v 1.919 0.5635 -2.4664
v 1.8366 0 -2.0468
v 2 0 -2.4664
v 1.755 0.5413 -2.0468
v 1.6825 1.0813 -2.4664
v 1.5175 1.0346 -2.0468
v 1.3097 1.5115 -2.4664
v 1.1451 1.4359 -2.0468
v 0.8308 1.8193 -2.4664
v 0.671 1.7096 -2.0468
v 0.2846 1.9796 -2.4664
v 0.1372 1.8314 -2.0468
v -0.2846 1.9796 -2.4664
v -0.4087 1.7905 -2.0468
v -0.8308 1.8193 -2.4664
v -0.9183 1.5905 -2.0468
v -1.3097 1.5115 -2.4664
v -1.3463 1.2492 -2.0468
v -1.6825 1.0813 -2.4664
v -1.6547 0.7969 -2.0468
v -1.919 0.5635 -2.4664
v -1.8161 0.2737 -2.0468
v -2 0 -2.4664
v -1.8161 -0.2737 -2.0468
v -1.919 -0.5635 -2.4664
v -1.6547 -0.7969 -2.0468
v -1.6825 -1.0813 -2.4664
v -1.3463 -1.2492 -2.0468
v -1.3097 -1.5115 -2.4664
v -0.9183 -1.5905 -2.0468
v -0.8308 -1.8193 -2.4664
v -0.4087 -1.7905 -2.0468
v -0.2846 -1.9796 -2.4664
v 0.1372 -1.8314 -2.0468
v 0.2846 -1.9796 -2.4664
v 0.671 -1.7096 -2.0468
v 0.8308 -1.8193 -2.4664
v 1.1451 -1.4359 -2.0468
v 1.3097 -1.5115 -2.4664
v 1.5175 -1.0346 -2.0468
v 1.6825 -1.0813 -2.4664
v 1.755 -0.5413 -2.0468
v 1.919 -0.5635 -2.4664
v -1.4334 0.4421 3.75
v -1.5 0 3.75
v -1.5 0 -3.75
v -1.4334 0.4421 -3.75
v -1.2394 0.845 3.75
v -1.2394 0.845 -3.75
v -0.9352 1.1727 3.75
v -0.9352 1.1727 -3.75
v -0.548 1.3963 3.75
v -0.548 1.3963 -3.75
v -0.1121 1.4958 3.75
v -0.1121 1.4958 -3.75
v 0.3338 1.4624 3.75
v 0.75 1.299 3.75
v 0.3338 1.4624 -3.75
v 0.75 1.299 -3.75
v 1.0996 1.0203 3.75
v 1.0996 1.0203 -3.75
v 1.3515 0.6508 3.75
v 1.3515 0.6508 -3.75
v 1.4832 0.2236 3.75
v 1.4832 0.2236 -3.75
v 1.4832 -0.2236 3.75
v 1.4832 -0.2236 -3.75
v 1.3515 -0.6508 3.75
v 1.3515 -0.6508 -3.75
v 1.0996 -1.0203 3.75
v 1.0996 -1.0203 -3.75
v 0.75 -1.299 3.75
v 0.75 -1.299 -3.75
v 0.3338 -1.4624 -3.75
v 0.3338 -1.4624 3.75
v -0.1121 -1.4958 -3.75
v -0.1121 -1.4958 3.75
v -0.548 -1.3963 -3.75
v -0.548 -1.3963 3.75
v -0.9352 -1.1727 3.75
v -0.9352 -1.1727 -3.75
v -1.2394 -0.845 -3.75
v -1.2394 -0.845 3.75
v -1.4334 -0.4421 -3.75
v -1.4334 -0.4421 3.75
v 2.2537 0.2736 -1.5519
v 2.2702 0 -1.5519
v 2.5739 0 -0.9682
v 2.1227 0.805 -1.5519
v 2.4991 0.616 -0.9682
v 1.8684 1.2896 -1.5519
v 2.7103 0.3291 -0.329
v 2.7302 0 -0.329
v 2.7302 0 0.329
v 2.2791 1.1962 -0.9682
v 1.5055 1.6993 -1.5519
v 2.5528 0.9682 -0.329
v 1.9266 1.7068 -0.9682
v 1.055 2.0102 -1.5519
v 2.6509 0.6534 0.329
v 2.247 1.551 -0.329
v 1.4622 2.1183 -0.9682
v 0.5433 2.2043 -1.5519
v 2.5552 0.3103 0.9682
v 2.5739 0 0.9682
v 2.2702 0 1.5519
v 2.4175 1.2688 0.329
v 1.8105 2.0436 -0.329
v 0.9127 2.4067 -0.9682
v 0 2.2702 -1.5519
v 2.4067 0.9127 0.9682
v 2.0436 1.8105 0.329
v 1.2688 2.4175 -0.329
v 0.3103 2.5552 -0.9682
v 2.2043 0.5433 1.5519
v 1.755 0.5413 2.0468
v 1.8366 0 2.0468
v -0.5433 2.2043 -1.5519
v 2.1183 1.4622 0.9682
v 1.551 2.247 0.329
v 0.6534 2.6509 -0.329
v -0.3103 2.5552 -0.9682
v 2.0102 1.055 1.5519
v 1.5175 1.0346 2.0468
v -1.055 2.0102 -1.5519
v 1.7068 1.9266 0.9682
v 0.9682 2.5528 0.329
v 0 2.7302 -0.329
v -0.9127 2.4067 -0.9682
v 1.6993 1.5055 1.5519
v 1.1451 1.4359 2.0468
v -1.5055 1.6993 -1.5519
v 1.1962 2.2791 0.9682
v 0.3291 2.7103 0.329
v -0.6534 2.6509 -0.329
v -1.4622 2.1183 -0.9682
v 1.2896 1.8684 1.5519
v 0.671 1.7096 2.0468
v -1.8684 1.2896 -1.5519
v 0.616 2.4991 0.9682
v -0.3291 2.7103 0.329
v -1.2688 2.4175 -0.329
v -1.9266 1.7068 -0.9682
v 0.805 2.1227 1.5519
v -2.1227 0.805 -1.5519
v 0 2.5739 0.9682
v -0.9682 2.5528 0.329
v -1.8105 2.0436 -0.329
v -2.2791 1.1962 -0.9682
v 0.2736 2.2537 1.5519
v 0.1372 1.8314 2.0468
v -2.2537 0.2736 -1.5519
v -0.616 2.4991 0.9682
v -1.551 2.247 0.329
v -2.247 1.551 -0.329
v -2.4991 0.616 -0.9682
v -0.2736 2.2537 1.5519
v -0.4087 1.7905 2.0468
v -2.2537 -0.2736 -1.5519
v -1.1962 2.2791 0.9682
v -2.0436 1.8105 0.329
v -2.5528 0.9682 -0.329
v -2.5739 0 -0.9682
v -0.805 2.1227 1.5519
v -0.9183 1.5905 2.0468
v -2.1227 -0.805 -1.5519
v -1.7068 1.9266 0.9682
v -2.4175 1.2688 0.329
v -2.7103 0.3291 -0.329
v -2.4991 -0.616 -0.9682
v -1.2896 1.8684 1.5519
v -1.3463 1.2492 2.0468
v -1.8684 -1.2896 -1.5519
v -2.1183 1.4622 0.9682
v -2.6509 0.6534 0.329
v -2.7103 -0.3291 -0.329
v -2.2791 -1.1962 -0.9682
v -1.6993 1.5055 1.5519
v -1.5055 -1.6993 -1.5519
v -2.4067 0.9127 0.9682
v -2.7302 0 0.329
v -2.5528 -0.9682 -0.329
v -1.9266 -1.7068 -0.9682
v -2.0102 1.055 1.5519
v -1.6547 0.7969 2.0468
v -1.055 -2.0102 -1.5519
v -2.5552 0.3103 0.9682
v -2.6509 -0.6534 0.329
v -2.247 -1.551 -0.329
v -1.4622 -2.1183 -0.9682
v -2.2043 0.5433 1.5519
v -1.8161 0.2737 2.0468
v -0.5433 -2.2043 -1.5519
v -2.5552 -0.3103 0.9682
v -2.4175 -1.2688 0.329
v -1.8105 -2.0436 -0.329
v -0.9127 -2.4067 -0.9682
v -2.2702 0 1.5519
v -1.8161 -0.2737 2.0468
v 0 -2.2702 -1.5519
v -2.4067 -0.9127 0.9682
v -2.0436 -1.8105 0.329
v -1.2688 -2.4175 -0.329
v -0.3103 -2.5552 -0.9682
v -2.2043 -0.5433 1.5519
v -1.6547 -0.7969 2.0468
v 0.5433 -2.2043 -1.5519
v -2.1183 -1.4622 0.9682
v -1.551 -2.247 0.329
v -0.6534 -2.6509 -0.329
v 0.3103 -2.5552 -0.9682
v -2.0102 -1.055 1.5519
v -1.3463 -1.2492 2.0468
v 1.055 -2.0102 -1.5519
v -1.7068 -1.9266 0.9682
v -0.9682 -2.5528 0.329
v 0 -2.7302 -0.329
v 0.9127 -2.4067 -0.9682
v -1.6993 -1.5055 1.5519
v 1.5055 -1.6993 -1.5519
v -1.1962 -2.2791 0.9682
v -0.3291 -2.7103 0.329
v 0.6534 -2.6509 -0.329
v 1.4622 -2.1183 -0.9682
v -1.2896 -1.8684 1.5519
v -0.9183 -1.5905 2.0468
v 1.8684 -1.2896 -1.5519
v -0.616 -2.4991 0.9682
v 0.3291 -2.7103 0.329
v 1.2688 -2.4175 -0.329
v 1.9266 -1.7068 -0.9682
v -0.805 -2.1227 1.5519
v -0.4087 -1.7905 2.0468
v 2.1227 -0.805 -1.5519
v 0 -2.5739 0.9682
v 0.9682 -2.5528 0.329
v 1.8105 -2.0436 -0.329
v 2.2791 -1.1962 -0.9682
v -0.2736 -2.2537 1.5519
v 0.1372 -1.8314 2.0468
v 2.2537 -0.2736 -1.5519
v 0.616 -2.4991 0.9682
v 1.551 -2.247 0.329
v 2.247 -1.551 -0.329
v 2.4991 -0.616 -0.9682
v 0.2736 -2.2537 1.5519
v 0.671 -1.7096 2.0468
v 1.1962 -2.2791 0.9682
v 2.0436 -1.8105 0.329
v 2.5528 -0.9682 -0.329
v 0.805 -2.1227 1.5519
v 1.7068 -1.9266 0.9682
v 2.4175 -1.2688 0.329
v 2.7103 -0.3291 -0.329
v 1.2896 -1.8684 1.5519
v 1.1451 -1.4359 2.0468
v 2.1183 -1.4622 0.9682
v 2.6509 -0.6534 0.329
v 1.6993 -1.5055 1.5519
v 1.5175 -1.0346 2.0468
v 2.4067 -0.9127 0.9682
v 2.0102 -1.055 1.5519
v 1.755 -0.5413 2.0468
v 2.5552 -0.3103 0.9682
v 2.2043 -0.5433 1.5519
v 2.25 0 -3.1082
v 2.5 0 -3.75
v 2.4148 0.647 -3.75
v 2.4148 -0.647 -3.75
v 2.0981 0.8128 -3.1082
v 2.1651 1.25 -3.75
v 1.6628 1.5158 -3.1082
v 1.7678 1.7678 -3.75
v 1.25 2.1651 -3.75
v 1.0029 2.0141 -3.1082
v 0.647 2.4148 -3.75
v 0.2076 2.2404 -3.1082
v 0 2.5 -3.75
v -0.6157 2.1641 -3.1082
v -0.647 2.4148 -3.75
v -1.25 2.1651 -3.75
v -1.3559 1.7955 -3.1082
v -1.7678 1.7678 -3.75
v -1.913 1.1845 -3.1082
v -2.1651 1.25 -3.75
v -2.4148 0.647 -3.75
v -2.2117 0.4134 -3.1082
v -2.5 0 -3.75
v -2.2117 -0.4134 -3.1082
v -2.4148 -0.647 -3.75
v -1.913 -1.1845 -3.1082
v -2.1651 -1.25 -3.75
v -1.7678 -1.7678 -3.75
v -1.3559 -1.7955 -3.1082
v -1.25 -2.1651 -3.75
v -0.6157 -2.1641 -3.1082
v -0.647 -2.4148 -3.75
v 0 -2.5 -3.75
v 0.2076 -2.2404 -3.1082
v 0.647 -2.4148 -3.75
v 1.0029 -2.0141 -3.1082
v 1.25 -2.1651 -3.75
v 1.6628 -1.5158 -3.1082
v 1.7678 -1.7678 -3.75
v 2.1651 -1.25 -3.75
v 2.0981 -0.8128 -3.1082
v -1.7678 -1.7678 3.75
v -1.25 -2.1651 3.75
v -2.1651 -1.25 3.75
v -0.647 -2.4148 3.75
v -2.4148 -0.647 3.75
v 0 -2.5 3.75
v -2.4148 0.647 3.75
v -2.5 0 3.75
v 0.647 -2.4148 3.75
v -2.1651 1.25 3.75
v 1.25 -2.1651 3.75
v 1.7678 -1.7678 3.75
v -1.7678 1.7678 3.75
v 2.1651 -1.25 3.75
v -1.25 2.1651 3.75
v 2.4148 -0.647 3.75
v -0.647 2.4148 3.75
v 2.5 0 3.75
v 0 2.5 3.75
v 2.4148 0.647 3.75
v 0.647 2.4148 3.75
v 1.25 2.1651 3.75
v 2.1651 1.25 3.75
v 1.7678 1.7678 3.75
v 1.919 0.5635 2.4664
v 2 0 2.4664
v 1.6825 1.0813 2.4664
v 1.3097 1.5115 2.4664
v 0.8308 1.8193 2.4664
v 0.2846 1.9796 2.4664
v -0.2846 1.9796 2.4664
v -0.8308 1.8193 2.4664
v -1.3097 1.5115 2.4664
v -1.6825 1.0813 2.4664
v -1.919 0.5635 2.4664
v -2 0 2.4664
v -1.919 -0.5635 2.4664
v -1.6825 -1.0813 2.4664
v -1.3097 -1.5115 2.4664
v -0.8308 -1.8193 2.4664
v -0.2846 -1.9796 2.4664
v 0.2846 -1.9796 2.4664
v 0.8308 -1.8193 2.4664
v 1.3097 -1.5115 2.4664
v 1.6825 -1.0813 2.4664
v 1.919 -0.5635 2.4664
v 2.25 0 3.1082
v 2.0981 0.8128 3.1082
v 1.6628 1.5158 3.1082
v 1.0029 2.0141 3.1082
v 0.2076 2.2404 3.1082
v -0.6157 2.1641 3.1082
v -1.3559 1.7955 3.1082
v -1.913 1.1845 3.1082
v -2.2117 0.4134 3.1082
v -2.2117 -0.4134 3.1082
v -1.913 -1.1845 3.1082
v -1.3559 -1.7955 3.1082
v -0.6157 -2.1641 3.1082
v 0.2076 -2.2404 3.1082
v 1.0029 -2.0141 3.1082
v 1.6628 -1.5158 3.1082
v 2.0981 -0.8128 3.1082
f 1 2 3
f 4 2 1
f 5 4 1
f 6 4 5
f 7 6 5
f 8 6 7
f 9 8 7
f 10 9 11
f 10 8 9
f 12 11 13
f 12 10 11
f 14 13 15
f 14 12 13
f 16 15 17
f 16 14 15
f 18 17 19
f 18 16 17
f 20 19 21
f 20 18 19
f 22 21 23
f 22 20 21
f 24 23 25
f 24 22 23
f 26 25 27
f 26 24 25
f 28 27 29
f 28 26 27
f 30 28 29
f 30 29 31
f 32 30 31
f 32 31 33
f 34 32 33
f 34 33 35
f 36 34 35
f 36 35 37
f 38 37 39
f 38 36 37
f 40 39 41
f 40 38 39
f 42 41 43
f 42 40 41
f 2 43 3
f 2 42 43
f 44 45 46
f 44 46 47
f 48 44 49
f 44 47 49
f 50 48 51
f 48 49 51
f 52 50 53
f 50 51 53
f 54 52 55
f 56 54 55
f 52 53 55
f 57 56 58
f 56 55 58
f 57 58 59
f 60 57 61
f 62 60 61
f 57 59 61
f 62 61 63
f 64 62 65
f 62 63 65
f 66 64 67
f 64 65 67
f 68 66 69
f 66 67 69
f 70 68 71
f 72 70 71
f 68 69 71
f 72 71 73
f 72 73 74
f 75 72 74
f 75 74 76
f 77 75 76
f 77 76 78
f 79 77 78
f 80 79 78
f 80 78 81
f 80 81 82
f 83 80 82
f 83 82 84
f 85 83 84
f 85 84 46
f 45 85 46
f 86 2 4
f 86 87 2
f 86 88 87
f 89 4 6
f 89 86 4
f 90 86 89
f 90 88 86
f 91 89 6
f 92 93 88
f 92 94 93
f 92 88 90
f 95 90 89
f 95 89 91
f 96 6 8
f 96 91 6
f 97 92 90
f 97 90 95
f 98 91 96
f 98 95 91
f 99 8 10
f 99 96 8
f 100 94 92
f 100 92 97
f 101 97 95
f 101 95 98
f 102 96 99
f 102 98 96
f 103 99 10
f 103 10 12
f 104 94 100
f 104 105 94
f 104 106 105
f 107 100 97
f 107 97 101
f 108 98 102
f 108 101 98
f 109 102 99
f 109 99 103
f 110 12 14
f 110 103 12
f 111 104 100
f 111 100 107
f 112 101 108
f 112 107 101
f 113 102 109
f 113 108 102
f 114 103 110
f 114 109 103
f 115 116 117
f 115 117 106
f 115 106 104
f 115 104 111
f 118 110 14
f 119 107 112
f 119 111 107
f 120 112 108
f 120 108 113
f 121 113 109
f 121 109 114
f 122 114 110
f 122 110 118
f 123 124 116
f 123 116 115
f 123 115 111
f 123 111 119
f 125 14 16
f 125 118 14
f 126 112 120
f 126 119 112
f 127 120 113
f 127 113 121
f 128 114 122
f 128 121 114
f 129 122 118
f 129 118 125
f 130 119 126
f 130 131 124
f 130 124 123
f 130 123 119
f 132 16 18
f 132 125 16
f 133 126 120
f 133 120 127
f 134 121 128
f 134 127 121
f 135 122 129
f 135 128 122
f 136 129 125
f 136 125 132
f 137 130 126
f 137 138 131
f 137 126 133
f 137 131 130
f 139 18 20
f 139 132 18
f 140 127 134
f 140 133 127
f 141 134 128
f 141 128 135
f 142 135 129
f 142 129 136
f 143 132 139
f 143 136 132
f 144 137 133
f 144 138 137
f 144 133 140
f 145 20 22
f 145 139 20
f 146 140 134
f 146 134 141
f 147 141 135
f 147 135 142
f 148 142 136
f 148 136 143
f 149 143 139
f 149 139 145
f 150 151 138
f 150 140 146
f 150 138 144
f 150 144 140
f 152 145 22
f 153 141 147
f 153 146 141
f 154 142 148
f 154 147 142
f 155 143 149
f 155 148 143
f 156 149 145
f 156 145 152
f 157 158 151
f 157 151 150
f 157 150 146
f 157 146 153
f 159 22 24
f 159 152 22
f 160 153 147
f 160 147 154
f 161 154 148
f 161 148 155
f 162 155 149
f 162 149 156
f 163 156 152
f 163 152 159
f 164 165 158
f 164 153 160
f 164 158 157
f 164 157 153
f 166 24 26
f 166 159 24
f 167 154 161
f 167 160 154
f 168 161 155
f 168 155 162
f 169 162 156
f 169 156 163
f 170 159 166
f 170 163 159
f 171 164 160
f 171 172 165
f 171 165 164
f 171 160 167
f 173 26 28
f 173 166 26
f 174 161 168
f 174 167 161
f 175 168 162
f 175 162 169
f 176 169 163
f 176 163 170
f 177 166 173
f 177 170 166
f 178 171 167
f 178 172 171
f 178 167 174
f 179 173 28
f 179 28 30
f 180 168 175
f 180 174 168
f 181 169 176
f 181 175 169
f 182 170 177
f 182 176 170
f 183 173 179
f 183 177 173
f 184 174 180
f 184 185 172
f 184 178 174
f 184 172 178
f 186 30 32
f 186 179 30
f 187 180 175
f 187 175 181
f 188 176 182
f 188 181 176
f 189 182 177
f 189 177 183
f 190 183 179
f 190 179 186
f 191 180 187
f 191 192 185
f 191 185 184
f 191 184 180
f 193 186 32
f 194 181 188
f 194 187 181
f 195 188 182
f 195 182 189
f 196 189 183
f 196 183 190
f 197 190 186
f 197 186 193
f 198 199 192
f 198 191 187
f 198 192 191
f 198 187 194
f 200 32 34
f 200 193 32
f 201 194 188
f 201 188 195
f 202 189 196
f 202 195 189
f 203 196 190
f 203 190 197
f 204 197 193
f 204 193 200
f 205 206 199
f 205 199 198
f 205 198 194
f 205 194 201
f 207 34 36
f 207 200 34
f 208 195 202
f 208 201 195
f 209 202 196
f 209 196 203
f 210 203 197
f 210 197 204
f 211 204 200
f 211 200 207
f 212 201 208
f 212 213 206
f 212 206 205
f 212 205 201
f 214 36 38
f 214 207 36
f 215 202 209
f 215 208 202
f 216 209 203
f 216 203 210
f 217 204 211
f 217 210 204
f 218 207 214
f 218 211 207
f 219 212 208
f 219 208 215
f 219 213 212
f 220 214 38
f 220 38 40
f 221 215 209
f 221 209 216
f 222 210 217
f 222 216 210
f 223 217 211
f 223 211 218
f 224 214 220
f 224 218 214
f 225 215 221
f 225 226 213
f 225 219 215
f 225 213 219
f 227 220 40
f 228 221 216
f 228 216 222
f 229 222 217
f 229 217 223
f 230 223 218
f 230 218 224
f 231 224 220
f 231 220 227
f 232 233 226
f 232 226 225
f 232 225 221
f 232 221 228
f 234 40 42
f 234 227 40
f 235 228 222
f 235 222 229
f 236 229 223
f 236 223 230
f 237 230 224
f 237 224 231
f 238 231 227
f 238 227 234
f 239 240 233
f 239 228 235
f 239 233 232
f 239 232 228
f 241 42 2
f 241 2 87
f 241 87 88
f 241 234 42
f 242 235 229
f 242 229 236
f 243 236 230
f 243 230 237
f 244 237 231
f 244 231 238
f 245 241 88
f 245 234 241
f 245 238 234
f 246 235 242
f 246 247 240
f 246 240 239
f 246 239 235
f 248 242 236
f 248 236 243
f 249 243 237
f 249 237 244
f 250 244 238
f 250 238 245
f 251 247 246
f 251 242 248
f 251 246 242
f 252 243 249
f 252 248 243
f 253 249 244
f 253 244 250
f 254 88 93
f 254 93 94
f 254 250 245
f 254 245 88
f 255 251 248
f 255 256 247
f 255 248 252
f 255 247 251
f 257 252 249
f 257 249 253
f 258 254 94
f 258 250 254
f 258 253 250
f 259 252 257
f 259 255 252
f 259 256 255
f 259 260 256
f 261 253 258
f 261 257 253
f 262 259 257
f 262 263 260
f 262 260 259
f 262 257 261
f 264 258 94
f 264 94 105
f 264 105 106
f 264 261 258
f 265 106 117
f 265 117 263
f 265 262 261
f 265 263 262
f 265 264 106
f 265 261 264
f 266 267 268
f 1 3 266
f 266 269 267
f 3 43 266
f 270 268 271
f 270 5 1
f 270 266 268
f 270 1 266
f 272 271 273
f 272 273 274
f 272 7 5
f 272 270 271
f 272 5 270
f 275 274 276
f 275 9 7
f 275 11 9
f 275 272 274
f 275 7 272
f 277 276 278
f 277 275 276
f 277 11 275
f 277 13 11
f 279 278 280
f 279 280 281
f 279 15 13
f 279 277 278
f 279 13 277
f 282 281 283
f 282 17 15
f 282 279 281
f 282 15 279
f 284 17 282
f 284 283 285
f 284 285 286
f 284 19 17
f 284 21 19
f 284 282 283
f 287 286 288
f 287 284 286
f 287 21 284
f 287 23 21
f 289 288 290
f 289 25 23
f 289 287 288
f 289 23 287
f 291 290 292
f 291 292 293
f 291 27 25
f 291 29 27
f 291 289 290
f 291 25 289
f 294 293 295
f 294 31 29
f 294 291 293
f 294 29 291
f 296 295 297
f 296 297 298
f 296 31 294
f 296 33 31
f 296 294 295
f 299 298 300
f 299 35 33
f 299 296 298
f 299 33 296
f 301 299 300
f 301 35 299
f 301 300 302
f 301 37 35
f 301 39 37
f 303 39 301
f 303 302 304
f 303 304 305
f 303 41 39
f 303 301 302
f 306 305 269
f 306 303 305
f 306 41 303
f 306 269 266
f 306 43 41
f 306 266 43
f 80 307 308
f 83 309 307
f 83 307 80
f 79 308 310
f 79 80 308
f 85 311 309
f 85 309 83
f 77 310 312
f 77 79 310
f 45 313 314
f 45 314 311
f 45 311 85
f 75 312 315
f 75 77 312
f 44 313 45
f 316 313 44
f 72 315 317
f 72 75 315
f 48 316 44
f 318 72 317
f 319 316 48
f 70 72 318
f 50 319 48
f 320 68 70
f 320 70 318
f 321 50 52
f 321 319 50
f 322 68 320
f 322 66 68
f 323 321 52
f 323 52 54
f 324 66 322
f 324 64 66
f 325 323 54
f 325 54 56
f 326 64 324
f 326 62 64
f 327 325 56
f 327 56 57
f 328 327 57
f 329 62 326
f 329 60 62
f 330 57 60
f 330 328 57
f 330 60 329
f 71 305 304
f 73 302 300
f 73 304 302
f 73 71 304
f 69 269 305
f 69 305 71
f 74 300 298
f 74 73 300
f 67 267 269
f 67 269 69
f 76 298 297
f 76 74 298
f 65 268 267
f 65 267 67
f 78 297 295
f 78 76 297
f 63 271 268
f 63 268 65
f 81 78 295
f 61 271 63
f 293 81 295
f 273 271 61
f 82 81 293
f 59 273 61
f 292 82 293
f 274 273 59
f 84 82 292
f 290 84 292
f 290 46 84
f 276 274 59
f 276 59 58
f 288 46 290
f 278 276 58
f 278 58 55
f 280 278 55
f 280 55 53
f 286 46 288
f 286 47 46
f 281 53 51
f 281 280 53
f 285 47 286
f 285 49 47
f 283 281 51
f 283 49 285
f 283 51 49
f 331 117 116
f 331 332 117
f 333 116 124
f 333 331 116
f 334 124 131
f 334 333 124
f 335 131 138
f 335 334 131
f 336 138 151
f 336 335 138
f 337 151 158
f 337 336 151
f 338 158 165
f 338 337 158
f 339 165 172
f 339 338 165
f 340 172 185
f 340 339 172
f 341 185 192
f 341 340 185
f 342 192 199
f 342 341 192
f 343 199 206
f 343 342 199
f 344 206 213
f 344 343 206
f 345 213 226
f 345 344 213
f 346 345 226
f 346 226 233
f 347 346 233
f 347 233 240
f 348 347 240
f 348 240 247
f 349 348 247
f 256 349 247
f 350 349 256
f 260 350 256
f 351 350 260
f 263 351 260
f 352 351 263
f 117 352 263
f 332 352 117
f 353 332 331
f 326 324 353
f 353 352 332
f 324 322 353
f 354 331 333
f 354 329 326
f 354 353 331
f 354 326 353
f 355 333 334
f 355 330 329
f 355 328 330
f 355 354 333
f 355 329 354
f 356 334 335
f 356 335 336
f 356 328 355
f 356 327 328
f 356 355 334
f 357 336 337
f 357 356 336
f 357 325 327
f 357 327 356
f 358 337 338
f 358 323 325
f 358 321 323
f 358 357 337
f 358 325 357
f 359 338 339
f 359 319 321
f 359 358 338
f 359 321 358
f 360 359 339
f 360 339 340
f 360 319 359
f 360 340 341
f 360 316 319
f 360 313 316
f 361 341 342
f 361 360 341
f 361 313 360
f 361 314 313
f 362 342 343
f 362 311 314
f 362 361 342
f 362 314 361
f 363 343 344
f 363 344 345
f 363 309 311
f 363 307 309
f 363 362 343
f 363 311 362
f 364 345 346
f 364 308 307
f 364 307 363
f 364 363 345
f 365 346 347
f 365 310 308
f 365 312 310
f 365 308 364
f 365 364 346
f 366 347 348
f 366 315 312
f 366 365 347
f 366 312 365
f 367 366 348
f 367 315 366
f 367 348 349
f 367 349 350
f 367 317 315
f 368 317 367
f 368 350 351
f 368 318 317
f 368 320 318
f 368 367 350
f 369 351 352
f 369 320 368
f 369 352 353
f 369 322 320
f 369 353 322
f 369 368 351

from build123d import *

# Parameters (mm, degrees)
CROQUIS5_R            = 1.5
CORTAR_EXTRUIR3_DEPTH = 10


with BuildPart() as part:
    # Croquis3 → Revolución3 (revolve)
    with BuildSketch(Plane(origin=(0, 0, 0), x_dir=(1, 0, 0), z_dir=(0, 1, 0))):
        with BuildLine():
            Line((0, 3.75), (2.5, 3.75))
            Line((2.5, 3.75), (2, 2.466364983))
            Line((2, 2.466364983), (1.836579632, 2.046820768))
            ThreePointArc((1.836579632, 2.046820768), (2.75, 0), (1.836579632, -2.046820768))
            Line((1.836579632, -2.046820768), (2, -2.466364983))
            Line((2, -2.466364983), (2.5, -3.75))
            Line((2.5, -3.75), (0, -3.75))
            Line((0, -3.75), (0, 3.75))
        make_face()
    revolve(axis=Axis((0, 0, -3.75), (0, 0, 1)))

    # Croquis5 → Cortar-Extruir3 (cut)
    with BuildSketch(Plane(origin=(0, 0, -3.75), x_dir=(-1, 0, 0), z_dir=(0, 0, -1))):
        Circle(CROQUIS5_R)
    extrude(amount=-CORTAR_EXTRUIR3_DEPTH, mode=Mode.SUBTRACT)


solid = part.part
